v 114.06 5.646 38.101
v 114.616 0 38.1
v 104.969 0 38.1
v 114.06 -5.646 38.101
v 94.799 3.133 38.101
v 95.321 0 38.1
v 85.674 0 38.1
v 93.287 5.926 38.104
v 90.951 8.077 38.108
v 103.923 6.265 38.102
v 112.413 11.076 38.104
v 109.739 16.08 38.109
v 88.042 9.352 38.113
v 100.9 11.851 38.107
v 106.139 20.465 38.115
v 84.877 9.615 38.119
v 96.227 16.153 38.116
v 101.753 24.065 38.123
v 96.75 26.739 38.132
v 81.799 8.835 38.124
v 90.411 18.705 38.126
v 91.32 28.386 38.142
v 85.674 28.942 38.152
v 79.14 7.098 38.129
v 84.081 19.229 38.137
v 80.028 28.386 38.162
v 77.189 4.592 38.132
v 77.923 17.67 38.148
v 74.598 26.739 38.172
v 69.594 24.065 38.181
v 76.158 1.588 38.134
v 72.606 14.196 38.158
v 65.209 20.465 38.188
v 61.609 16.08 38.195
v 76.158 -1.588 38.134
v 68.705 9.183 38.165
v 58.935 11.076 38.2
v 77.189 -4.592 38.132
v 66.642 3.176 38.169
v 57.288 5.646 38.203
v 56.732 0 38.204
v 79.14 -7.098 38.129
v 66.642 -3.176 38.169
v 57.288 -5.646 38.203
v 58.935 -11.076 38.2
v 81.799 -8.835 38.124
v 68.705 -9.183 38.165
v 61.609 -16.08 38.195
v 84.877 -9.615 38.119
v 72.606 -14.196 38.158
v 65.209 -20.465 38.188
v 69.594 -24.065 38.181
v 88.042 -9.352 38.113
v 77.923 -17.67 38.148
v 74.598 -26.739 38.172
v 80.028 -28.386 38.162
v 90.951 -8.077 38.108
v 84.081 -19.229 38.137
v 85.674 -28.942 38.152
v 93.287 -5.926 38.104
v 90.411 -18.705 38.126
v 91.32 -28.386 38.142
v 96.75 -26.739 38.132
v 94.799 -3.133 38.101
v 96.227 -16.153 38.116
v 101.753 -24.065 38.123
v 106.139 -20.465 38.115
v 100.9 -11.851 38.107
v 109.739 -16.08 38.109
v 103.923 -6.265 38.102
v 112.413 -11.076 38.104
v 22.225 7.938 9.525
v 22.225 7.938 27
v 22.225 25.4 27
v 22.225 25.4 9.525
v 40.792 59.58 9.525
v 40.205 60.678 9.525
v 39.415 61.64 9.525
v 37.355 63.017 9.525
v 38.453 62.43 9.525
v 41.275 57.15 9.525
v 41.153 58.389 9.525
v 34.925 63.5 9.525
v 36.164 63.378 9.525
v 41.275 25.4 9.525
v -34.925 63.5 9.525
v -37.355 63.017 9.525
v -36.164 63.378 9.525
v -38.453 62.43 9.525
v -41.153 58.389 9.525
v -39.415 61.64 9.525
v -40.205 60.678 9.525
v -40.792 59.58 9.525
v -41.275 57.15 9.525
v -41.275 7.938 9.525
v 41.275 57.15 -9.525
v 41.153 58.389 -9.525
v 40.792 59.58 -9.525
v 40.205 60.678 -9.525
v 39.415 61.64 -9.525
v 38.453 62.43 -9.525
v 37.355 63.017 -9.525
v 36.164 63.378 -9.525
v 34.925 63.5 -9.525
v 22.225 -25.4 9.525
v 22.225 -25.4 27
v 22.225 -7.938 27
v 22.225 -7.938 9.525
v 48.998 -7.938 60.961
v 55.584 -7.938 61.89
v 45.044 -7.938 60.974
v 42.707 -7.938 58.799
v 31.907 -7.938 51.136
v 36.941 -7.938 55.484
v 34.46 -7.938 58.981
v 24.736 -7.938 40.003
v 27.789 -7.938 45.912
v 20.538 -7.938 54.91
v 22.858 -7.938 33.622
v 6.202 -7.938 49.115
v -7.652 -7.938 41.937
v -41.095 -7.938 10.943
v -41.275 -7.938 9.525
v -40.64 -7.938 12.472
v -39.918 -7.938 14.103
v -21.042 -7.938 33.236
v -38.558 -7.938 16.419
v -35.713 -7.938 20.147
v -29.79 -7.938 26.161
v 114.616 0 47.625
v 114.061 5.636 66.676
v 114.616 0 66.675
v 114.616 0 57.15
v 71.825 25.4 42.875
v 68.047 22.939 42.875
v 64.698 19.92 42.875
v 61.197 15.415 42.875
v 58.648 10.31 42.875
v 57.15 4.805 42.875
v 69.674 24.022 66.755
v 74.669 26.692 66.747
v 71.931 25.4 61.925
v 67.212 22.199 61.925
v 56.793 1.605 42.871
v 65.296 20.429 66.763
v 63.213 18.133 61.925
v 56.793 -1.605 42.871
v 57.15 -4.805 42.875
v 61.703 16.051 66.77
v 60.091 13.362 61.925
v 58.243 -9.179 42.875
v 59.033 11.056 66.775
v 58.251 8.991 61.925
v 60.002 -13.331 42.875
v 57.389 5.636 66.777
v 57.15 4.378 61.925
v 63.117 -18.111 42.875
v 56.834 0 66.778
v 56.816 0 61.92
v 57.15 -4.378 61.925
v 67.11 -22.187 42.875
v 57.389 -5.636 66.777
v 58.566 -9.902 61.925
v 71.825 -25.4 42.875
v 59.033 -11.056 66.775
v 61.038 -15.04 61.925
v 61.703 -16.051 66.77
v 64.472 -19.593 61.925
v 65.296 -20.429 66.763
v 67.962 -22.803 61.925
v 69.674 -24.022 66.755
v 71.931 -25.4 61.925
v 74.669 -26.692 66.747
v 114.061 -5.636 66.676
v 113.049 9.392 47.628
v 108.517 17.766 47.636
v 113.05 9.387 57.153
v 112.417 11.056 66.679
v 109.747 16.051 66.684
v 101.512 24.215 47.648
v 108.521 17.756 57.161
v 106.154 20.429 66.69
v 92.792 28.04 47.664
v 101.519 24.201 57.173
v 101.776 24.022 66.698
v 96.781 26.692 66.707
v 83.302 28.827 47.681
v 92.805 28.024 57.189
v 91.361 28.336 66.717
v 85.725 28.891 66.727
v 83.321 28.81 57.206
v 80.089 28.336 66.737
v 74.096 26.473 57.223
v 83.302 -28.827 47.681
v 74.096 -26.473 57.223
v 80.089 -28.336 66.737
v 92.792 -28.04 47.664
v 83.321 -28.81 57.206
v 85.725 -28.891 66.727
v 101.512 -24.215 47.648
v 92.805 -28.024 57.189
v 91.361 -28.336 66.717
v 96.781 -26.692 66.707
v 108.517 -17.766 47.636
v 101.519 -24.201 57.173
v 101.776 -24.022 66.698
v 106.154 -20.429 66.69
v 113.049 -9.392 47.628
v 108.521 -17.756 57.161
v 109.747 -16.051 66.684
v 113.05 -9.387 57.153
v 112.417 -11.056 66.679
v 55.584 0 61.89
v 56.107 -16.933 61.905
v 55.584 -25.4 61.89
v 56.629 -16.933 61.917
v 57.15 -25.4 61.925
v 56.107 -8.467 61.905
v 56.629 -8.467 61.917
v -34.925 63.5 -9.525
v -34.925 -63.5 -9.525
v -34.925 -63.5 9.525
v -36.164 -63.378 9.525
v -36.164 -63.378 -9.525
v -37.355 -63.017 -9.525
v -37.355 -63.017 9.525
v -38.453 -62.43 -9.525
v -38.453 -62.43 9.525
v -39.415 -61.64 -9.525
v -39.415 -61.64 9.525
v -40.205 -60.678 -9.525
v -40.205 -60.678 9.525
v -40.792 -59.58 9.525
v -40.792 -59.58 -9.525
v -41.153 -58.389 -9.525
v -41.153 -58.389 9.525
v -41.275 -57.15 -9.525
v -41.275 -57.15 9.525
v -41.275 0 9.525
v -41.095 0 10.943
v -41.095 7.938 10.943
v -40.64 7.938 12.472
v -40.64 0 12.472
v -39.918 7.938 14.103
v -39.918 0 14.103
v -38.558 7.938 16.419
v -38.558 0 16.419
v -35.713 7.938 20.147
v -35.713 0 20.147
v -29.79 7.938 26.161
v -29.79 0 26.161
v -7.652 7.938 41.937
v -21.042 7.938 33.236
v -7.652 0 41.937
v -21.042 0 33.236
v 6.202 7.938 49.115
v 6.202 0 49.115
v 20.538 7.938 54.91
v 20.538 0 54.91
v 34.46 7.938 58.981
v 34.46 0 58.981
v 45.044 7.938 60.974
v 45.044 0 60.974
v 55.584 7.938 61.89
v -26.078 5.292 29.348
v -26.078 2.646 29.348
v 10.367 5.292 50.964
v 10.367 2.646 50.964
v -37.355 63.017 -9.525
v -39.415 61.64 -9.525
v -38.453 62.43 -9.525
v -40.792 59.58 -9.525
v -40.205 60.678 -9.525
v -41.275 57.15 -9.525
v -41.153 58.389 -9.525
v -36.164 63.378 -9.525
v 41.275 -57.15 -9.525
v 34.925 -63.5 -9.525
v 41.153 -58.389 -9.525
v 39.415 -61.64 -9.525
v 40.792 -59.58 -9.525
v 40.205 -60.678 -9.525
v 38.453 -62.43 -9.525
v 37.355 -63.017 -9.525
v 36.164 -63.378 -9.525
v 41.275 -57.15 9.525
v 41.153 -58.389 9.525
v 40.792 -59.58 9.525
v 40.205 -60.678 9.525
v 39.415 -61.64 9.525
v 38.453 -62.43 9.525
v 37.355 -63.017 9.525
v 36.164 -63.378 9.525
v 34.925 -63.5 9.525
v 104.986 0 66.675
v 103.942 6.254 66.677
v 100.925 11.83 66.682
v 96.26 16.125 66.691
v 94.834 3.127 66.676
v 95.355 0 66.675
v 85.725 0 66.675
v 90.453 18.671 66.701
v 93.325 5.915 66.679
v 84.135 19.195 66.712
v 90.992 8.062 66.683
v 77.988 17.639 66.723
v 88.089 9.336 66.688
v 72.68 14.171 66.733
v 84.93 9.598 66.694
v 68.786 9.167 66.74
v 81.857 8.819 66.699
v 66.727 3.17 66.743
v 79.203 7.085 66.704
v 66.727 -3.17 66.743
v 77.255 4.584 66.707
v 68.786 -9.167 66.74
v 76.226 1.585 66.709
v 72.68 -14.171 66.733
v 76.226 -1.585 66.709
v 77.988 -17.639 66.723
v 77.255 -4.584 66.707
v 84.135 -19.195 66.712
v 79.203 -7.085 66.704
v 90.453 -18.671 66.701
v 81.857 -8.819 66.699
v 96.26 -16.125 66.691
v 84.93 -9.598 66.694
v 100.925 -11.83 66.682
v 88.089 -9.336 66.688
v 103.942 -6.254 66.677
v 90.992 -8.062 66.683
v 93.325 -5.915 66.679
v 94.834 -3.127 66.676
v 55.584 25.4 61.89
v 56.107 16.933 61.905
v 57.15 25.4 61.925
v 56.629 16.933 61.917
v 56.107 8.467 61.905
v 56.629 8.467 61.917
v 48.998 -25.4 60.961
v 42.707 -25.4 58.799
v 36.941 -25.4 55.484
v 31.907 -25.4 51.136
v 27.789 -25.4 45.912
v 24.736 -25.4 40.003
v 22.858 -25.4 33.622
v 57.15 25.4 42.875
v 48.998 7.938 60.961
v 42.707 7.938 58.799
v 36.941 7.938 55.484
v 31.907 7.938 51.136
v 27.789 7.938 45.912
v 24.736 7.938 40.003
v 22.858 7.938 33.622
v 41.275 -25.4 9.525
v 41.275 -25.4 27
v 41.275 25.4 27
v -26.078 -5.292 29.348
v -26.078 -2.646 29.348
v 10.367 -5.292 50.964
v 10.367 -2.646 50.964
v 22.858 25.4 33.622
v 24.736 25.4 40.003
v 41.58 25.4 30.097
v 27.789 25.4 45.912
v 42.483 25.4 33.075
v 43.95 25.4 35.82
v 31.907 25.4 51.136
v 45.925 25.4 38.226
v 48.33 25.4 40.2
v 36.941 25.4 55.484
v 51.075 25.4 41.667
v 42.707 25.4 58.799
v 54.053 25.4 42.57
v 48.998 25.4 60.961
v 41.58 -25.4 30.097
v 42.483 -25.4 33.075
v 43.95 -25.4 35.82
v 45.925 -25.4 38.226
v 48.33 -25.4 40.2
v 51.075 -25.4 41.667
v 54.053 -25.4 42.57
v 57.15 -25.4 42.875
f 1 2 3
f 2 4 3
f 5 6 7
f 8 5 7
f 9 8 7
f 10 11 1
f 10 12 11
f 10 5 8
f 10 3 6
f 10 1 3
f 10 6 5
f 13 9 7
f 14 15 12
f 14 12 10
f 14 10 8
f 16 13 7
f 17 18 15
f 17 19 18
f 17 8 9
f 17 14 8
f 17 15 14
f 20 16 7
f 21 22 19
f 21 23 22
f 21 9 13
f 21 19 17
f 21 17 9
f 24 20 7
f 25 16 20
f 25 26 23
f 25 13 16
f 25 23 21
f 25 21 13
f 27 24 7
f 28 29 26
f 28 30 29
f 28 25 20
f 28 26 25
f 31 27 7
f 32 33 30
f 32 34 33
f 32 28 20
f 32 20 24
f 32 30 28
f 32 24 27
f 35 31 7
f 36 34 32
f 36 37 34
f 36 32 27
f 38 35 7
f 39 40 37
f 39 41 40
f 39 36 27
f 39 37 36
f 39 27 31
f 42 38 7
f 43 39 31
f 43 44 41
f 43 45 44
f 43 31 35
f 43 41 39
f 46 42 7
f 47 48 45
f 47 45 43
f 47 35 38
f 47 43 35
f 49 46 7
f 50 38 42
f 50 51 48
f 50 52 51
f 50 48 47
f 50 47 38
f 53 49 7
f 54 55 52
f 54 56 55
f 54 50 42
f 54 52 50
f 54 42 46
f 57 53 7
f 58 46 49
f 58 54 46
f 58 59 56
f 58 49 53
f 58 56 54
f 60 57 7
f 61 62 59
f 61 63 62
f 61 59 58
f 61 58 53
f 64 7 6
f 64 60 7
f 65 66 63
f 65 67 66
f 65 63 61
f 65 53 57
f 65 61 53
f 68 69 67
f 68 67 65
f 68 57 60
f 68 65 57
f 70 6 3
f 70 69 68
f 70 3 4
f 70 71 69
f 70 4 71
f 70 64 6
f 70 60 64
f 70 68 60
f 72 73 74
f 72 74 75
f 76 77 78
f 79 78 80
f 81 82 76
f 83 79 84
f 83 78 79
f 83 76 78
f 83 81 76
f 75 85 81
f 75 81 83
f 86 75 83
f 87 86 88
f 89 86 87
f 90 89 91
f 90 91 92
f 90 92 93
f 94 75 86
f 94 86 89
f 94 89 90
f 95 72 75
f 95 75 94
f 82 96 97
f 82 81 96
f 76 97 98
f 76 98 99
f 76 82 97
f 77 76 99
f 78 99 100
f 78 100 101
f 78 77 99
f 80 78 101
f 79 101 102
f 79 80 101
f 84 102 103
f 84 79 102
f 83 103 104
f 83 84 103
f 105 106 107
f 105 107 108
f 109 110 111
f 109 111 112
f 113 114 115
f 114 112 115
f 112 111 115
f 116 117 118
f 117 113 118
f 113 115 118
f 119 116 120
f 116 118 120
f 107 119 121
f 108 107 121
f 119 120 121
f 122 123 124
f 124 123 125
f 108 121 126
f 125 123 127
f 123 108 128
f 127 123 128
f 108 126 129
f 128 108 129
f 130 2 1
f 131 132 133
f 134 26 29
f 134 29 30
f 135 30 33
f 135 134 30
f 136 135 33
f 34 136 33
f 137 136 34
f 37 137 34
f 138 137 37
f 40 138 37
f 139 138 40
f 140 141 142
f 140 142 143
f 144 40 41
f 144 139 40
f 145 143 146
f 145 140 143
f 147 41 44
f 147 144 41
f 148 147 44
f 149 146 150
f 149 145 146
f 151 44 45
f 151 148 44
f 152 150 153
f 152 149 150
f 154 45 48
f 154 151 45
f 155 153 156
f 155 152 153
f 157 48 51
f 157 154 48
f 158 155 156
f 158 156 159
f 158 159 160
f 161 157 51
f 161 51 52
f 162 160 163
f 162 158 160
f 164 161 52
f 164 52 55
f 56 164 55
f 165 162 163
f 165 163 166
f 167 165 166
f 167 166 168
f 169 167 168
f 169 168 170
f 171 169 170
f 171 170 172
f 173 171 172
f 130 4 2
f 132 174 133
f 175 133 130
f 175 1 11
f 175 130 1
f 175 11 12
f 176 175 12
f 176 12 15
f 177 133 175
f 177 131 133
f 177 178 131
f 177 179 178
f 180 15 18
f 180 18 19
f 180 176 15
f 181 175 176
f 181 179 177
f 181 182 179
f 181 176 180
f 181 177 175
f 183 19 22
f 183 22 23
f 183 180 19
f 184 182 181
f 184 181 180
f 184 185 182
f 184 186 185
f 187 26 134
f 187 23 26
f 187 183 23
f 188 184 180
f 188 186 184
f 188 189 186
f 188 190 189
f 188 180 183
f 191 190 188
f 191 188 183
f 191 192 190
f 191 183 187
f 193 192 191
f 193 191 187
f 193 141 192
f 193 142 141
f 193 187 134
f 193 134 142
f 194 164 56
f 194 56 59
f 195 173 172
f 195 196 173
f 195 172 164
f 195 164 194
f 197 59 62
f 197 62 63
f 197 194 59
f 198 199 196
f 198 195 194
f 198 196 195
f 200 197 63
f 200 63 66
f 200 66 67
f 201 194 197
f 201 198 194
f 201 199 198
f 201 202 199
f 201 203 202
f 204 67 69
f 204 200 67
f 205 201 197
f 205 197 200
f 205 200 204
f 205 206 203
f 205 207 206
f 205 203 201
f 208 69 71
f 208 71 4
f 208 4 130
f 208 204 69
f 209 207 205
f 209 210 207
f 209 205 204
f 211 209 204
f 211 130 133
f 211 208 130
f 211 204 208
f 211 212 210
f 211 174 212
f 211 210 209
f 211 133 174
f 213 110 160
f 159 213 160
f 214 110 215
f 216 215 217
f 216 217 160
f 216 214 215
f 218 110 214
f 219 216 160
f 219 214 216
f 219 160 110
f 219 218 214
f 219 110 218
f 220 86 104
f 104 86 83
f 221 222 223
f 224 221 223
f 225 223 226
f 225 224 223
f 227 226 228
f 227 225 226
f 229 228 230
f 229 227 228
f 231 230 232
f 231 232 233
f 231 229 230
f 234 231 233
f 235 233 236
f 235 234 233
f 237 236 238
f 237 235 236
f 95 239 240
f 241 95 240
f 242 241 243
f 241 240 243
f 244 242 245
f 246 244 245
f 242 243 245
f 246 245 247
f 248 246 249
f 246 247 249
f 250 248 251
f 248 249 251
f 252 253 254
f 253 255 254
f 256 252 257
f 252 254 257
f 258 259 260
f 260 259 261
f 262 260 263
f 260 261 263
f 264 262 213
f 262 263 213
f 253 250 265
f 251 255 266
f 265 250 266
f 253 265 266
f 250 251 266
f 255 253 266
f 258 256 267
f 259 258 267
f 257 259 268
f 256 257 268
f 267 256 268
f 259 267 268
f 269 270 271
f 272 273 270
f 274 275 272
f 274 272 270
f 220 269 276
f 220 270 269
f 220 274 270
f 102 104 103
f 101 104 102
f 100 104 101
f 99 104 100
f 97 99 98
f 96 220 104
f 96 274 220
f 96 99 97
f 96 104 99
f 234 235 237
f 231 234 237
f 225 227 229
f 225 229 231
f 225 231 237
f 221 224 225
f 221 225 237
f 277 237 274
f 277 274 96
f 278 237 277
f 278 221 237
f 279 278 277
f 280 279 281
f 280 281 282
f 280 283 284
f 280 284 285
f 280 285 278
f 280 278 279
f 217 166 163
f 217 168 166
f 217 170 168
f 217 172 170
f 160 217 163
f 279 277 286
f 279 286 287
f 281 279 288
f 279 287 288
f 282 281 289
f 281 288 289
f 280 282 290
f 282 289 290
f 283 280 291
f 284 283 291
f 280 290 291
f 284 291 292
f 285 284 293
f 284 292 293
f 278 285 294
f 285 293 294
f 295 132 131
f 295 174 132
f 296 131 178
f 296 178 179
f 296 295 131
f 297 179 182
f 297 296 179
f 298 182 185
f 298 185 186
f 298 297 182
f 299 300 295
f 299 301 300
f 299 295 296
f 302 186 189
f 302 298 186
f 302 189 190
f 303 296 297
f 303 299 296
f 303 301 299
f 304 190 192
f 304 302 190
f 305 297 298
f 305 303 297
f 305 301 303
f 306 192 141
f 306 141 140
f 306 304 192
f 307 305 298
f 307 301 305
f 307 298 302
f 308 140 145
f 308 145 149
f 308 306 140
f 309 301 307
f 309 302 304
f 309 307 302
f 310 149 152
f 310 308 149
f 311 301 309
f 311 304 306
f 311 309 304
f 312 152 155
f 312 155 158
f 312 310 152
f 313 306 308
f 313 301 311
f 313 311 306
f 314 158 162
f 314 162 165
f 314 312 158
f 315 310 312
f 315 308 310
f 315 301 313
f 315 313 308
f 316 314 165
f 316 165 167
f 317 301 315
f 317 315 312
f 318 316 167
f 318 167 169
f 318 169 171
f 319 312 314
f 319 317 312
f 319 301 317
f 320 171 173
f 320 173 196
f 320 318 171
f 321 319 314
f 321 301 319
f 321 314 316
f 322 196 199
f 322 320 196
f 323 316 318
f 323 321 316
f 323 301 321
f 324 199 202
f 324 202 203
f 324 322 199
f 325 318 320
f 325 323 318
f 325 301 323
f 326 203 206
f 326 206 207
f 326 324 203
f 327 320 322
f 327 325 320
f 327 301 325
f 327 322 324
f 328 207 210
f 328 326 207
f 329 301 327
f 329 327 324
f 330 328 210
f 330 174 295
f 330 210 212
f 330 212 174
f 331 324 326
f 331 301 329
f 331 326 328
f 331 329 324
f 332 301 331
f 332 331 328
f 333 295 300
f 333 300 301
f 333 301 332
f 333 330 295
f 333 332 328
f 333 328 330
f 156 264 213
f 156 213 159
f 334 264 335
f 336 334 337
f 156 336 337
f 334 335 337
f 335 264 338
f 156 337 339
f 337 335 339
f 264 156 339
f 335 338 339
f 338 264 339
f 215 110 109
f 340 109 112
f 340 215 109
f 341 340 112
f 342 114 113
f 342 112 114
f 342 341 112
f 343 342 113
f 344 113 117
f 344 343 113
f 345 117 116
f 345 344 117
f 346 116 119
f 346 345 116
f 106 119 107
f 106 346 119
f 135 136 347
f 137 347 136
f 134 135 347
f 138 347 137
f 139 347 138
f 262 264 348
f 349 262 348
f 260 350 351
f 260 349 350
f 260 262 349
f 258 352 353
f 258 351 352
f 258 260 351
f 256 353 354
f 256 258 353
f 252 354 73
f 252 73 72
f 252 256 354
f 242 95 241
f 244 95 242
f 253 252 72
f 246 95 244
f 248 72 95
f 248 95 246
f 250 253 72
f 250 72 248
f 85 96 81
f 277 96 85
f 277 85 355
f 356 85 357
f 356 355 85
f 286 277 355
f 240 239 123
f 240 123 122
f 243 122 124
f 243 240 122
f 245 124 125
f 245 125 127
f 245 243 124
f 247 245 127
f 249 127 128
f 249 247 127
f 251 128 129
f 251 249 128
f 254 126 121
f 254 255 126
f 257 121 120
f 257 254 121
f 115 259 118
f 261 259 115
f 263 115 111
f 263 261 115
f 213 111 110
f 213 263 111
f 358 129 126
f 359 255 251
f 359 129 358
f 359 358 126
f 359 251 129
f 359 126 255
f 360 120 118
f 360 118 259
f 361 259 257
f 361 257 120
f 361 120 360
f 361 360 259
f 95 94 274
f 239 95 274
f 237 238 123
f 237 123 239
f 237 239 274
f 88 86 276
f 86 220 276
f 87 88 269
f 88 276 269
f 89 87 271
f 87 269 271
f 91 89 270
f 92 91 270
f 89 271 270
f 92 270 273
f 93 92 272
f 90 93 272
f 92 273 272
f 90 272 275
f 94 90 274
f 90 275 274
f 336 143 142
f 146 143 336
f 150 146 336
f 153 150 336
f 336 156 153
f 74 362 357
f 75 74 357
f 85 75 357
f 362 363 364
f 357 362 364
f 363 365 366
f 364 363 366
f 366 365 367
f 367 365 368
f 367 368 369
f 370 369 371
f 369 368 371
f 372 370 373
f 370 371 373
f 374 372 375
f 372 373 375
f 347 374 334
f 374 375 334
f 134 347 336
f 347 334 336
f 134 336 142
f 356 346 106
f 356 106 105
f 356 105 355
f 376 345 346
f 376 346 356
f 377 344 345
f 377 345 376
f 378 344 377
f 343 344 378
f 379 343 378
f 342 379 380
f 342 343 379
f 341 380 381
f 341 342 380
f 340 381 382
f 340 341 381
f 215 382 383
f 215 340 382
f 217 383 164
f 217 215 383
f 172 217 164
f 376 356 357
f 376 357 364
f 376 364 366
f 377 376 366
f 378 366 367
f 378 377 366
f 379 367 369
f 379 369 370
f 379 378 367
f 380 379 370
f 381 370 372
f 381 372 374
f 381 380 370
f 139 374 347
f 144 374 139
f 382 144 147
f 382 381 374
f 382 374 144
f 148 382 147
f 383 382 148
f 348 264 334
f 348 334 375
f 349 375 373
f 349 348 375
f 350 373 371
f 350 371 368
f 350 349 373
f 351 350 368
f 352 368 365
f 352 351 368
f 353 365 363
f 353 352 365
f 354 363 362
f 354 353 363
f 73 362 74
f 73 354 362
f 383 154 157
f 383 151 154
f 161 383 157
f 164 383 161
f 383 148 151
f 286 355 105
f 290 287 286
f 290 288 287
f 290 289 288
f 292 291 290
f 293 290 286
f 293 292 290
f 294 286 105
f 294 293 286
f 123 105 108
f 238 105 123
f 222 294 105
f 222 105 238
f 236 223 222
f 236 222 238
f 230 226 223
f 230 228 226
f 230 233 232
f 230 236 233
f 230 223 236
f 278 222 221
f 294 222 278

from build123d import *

# Parameters (mm, degrees)
F1_DEPTH = 63.5
F2_DEPTH = 25.4
F3_DEPTH = 7.9375
F5_R     = 6.35


with BuildPart() as f1:
    # F0 (on Front) → F1 (new body, symmetric)
    with BuildSketch(Plane.XZ):
        Polygon((22.225, 9.525), (-41.275, 9.525), (-41.275, -9.525), (41.275, -9.525), (41.275, 9.525), align=None)
    extrude(amount=F1_DEPTH, both=True)

    # F0 (on Front) → F2 (join, symmetric)
    with BuildSketch(Plane.XZ):
        with BuildLine():
            Line((22.225, 27.0002), (22.225, 9.525))
            Line((22.225, 9.525), (41.275, 9.525))
            Line((41.275, 9.525), (41.275, 27.0002))
            ThreePointArc((41.275, 27.0002), (45.9246798487, 38.2255201513), (57.15, 42.8752))
            Line((57.15, 42.8752), (63.8163211342, 42.8752))
            Line((63.8163211342, 42.8752), (63.8163211342, 61.9252))
            Line((63.8163211342, 61.9252), (57.15, 61.9252))
            add(Edge.make_bspline(
                [(55.5844693113, 61.8900945063), (56.1070749883, 61.9064212044), (56.6289469993, 61.918151508), (57.15, 61.9252)],
                knots=[110.2369029283, 110.2369029283, 110.2369029283, 110.2369029283, 111.5045361635, 111.5045361635, 111.5045361635, 111.5045361635], degree=3))
            ThreePointArc((55.5844693113, 61.8900945063), (31.9068644548, 51.1360598945), (22.225, 27.0002))
        make_face()
        Polygon((85.716497119, 61.9252), (63.8163211342, 61.9252), (63.8163211342, 42.8752), (85.6823946553, 42.8752), align=None)
    extrude(amount=F2_DEPTH, both=True)

    # F0 (on Front) → F3 (join, symmetric)
    with BuildSketch(Plane.XZ):
        with BuildLine():
            add(Edge.make_bspline(
                [(-41.275, 9.525), (-40.8583768694, 24.2901211008), (10.1372297725, 60.4702795479), (55.5844693113, 61.8900945063)],
                knots=[0, 0, 0, 0, 110.2369029283, 110.2369029283, 110.2369029283, 110.2369029283], degree=3))
            Line((-41.275, 9.525), (22.225, 9.525))
            Line((22.225, 9.525), (22.225, 27.0002))
            ThreePointArc((22.225, 27.0002), (31.9068644548, 51.1360598945), (55.5844693113, 61.8900945063))
        make_face()
    extrude(amount=F3_DEPTH, both=True)

    # F0 (on Front) → F4 (revolve)
    with BuildSketch(Plane.XZ):
        Polygon((85.725, 66.675), (85.716497119, 61.9252), (85.6823946553, 42.8752), (85.6738463044, 38.1), (114.6163211342, 38.1), (114.6163211342, 66.675), align=None)
    revolve(axis=Axis((85.6994231522, 0, 52.3875), (0.0017901527, 0, 0.9999983977)))

    # F5
    f5_edges = [f1.edges().sort_by_distance(p)[0] for p in [
        (-41.275, -63.5, 0),
        (41.275, -63.5, 0),
        (-41.275, 63.5, 0),
        (41.275, 63.5, 0),
    ]]
    fillet(f5_edges, radius=F5_R)


solid = f1.part
